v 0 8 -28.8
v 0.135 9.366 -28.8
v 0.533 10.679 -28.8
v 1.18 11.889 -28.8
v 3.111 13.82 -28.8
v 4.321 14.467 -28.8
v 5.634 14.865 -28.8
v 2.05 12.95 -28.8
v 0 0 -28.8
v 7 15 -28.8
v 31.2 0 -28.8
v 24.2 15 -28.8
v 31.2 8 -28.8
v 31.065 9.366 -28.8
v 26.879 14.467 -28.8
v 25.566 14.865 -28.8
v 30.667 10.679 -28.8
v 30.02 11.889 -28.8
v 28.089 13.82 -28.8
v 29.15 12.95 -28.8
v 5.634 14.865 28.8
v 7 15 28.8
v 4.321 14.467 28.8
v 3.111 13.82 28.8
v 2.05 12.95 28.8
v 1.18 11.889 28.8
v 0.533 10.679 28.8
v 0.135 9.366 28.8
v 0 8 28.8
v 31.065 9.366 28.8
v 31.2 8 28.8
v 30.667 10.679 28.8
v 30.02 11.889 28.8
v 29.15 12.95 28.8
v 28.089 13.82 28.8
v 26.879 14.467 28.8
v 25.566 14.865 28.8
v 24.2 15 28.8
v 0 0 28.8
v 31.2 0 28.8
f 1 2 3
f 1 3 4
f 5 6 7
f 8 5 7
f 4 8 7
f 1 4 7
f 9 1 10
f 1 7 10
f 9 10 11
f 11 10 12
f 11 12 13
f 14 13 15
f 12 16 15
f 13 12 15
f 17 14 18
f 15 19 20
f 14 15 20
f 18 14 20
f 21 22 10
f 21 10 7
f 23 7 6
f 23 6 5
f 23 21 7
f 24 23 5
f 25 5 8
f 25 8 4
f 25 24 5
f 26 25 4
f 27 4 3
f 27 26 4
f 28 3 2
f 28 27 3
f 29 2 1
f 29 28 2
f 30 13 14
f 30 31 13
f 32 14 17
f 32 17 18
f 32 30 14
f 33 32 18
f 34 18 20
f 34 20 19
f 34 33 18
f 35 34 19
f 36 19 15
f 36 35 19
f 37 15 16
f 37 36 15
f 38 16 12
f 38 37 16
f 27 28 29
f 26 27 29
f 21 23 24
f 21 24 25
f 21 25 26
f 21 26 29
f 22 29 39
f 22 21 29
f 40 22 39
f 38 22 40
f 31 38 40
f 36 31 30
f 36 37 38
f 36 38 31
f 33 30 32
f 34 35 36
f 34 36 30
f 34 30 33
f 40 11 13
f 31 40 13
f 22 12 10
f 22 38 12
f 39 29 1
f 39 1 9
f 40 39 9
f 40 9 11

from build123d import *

# Parameters (mm, degrees)
F1_DEPTH = 28.8


with BuildPart() as f1:
    # F0 (on Top) → F1 (new body, symmetric)
    with BuildSketch(Plane.XY):
        with BuildLine():
            Line((24.2, 15), (7, 15))
            ThreePointArc((7, 15), (2.0502525317, 12.9497474683), (0, 8))
            Line((0, 8), (0, 0))
            Line((0, 0), (31.2, 0))
            Line((31.2, 0), (31.2, 8))
            ThreePointArc((31.2, 8), (29.1497474683, 12.9497474683), (24.2, 15))
        make_face()
    extrude(amount=F1_DEPTH, both=True)


solid = f1.part
